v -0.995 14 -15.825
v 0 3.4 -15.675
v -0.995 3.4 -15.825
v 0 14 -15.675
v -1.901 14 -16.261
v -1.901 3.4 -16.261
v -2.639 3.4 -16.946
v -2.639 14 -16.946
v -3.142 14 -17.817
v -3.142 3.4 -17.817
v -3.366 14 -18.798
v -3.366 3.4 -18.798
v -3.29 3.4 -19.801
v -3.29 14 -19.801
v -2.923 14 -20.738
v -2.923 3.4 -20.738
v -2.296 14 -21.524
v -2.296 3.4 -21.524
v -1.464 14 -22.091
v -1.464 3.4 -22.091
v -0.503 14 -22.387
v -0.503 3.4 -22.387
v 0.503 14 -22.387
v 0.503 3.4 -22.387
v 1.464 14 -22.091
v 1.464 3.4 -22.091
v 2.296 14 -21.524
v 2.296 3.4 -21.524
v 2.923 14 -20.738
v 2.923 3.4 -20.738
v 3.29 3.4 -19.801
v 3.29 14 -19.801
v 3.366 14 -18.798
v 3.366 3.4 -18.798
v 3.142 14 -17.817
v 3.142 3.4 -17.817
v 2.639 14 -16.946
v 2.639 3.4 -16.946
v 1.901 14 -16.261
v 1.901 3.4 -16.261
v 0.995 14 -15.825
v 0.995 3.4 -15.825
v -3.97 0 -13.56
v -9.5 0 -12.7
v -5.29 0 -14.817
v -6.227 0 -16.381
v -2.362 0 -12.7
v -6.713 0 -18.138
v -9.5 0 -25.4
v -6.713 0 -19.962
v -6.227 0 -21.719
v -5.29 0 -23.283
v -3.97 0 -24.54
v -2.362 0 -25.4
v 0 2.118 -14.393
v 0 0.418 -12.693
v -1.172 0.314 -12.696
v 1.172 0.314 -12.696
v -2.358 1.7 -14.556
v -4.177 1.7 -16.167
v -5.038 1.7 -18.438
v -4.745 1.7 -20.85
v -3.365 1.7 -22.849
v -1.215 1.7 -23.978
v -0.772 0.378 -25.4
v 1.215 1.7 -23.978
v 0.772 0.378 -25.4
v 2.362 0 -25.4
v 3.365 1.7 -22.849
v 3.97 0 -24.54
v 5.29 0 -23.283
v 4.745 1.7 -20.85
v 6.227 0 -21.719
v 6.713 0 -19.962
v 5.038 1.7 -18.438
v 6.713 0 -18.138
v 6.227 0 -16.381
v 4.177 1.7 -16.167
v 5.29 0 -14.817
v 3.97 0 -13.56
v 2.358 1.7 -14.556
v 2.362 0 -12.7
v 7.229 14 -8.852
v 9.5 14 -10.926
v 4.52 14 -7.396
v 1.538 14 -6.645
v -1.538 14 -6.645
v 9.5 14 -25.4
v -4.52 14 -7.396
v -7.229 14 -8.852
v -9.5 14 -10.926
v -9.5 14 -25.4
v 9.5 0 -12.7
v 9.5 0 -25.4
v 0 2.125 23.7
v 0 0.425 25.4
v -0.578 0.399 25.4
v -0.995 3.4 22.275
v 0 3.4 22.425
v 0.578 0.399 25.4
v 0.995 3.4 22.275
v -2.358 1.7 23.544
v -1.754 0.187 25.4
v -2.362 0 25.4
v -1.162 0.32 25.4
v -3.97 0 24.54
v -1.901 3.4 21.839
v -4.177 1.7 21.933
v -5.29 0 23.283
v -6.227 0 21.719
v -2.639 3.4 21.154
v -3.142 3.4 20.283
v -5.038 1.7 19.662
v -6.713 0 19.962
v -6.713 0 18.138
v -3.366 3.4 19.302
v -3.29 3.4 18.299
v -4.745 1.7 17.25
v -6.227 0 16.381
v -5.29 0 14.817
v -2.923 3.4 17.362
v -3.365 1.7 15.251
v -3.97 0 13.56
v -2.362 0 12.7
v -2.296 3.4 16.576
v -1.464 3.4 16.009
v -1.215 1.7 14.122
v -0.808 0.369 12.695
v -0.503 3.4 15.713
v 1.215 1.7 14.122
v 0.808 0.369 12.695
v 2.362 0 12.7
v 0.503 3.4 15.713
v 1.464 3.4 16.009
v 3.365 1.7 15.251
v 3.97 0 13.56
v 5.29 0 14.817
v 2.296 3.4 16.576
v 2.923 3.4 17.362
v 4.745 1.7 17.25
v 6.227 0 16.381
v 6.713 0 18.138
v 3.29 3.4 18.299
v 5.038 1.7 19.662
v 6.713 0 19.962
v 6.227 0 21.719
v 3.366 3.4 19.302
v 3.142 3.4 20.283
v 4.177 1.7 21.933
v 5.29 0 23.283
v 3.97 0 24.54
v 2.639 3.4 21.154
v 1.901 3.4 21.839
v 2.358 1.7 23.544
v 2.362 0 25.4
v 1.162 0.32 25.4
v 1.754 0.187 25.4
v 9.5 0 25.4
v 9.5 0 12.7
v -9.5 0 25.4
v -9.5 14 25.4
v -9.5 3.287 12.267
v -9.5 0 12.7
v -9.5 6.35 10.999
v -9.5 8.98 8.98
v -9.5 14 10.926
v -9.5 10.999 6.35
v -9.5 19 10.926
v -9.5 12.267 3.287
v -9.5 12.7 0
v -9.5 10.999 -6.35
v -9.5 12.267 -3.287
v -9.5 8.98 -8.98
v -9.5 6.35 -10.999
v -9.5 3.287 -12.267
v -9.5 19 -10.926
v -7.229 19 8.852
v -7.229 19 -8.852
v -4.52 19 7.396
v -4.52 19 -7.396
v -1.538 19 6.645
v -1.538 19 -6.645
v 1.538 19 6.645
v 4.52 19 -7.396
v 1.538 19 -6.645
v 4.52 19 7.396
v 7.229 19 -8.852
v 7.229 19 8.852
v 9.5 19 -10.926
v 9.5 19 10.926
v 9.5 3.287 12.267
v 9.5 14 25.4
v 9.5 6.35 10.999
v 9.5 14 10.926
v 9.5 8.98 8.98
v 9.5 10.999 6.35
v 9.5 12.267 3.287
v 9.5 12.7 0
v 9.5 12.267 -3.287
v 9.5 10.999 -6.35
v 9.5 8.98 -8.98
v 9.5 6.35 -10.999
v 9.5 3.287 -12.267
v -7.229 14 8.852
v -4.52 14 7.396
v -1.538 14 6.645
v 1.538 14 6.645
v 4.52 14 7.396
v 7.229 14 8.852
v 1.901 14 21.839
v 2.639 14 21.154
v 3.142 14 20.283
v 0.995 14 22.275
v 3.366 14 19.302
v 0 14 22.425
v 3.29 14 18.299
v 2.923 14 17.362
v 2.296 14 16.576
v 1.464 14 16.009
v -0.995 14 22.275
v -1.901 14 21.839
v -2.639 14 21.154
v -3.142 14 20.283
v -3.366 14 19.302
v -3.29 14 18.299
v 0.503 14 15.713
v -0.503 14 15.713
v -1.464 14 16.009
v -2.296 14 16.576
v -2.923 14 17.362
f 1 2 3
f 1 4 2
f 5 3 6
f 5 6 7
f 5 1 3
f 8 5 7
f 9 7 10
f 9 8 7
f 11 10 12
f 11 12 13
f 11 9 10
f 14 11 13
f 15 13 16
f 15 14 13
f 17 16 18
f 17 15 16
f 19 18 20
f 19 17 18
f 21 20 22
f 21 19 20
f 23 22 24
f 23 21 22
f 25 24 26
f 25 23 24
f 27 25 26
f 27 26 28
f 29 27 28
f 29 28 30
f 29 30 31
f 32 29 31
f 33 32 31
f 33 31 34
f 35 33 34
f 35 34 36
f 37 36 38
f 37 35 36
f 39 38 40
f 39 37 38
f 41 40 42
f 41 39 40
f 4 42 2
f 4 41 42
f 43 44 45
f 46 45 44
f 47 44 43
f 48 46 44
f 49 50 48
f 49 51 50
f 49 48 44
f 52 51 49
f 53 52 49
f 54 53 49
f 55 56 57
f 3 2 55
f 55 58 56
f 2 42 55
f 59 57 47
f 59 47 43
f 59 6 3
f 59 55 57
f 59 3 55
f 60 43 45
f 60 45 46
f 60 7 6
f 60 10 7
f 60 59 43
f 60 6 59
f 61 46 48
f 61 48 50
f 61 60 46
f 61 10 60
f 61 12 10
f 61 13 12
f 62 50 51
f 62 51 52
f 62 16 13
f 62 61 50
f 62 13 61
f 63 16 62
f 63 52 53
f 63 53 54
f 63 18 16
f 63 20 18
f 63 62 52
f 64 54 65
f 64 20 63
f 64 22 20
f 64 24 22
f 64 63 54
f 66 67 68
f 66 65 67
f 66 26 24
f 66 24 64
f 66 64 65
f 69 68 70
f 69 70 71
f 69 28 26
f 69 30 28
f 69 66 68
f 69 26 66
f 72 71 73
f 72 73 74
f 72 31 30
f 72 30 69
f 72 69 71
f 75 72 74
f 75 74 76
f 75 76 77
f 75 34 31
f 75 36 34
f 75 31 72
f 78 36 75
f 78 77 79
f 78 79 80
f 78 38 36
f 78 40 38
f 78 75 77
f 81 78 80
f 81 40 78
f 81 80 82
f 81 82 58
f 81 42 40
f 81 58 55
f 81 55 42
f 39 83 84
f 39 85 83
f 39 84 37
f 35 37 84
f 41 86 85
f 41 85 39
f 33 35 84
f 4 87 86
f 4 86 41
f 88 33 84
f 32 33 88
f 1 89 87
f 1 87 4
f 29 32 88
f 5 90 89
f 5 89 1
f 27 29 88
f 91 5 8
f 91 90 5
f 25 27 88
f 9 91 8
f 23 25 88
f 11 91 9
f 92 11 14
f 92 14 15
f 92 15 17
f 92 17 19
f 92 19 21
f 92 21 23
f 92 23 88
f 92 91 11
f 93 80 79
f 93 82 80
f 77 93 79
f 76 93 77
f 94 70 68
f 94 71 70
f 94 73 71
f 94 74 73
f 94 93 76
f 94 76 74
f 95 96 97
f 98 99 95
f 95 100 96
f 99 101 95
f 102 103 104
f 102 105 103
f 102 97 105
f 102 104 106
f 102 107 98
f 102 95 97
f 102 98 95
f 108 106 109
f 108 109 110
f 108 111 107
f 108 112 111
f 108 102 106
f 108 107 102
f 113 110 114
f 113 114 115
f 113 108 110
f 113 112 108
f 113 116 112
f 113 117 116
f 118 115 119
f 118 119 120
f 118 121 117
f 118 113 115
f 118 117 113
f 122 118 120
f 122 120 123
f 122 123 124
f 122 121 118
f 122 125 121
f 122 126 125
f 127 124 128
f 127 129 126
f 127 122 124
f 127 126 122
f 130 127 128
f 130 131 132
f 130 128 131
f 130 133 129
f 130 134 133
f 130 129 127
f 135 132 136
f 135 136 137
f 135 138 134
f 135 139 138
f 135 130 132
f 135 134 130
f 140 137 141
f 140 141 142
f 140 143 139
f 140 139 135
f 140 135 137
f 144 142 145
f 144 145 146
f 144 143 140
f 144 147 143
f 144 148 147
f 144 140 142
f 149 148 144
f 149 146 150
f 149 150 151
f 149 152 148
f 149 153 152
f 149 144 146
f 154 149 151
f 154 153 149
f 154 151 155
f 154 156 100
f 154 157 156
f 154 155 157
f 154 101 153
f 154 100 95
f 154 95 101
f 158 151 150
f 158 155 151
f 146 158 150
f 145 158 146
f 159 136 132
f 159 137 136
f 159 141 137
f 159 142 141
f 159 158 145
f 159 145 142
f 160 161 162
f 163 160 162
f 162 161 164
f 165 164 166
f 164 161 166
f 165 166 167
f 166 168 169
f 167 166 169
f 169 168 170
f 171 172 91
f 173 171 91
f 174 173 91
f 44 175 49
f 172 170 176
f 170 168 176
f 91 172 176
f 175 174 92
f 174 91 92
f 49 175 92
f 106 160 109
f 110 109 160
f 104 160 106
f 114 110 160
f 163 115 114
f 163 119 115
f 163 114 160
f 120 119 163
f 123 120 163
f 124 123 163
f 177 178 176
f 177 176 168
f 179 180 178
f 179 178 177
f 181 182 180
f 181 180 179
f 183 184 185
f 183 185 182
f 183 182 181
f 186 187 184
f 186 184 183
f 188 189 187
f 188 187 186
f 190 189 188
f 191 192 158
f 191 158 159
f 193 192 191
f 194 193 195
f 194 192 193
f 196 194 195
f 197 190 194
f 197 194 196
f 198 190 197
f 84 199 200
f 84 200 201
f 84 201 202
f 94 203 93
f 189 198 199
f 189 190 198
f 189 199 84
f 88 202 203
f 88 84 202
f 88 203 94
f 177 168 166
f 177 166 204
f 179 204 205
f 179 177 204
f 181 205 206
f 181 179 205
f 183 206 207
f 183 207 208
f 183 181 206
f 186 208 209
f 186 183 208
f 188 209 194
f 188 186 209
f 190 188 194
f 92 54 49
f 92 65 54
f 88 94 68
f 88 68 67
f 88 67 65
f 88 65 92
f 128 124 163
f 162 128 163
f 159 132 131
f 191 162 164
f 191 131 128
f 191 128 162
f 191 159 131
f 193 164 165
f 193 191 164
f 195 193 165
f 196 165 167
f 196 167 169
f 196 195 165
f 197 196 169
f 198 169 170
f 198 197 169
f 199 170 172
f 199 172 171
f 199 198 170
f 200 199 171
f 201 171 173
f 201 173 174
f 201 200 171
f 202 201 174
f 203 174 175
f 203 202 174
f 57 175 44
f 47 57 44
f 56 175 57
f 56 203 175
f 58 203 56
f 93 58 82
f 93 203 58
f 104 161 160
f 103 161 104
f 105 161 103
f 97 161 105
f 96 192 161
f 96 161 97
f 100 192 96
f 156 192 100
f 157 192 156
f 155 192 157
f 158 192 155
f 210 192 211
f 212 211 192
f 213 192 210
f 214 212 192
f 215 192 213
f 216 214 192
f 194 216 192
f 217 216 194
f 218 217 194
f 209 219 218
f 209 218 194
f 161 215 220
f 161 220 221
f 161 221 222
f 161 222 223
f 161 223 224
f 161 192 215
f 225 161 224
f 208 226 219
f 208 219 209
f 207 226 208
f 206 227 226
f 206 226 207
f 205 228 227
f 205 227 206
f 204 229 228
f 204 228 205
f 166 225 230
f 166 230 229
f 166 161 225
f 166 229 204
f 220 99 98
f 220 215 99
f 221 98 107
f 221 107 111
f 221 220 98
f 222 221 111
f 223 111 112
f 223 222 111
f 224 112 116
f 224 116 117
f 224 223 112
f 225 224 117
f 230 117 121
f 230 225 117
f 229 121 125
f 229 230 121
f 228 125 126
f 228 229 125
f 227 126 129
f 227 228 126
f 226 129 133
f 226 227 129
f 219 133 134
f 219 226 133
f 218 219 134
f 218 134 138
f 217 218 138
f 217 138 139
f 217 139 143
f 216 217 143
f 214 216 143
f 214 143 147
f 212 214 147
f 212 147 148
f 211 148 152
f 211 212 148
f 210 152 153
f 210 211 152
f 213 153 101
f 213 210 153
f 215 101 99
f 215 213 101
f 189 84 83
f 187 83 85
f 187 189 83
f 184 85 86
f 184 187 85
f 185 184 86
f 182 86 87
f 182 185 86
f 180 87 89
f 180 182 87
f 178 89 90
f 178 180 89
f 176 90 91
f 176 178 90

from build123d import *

# Parameters (mm, degrees)
BOSS_EXTRUDE1_DEPTH                          = 9.5
CBORE_FOR_M12_HEX_HEAD_CAP_SCREW2_AT_2_COUNT = 2
CBORE_FOR_M12_HEX_HEAD_CAP_SCREW2_AT_2_PITCH = 38.1


with BuildPart() as part:
    # Sketch1 → Boss-Extrude1 (new, symmetric)
    with BuildSketch(Plane(origin=(0, 0, 0), x_dir=(0, 0, -1), z_dir=(1, 0, 0))):
        with BuildLine():
            Line((25.4, 19), (-25.4, 19))
            Line((-25.4, 19), (-25.4, 0))
            Line((-25.4, 0), (-12.7, 0))
            ThreePointArc((-12.7, 0), (0, 12.7), (12.7, 0))
            Line((12.7, 0), (25.4, 0))
            Line((25.4, 0), (25.4, 19))
        make_face()
    extrude(amount=BOSS_EXTRUDE1_DEPTH, both=True)

    # Sketch8 → CBORE for M12 Hex Head Cap Screw2 (revolve, cut)
    with BuildSketch(Plane(origin=(0, 19, -19.05), x_dir=(0, 0, 1), z_dir=(1, 0, 0))):
        Polygon((0, 0), (0, 19), (6.775, 19), (3.375, 15.6), (3.375, 5), (12.5, 5), (12.5, 0), align=None)
    cbore_for_m12_hex_head_cap_screw2 = revolve(axis=Axis((0, 25.35, -19.05), (0, -1, 0)), mode=Mode.SUBTRACT)

    # CBORE for M12 Hex Head Cap Screw2 at 2: CBORE for M12 Hex Head Cap Screw2 ×2
    with Locations(*[(0, 0, i * CBORE_FOR_M12_HEX_HEAD_CAP_SCREW2_AT_2_PITCH) for i in range(1, CBORE_FOR_M12_HEX_HEAD_CAP_SCREW2_AT_2_COUNT)]):
        add(cbore_for_m12_hex_head_cap_screw2, mode=Mode.SUBTRACT)


solid = part.part
